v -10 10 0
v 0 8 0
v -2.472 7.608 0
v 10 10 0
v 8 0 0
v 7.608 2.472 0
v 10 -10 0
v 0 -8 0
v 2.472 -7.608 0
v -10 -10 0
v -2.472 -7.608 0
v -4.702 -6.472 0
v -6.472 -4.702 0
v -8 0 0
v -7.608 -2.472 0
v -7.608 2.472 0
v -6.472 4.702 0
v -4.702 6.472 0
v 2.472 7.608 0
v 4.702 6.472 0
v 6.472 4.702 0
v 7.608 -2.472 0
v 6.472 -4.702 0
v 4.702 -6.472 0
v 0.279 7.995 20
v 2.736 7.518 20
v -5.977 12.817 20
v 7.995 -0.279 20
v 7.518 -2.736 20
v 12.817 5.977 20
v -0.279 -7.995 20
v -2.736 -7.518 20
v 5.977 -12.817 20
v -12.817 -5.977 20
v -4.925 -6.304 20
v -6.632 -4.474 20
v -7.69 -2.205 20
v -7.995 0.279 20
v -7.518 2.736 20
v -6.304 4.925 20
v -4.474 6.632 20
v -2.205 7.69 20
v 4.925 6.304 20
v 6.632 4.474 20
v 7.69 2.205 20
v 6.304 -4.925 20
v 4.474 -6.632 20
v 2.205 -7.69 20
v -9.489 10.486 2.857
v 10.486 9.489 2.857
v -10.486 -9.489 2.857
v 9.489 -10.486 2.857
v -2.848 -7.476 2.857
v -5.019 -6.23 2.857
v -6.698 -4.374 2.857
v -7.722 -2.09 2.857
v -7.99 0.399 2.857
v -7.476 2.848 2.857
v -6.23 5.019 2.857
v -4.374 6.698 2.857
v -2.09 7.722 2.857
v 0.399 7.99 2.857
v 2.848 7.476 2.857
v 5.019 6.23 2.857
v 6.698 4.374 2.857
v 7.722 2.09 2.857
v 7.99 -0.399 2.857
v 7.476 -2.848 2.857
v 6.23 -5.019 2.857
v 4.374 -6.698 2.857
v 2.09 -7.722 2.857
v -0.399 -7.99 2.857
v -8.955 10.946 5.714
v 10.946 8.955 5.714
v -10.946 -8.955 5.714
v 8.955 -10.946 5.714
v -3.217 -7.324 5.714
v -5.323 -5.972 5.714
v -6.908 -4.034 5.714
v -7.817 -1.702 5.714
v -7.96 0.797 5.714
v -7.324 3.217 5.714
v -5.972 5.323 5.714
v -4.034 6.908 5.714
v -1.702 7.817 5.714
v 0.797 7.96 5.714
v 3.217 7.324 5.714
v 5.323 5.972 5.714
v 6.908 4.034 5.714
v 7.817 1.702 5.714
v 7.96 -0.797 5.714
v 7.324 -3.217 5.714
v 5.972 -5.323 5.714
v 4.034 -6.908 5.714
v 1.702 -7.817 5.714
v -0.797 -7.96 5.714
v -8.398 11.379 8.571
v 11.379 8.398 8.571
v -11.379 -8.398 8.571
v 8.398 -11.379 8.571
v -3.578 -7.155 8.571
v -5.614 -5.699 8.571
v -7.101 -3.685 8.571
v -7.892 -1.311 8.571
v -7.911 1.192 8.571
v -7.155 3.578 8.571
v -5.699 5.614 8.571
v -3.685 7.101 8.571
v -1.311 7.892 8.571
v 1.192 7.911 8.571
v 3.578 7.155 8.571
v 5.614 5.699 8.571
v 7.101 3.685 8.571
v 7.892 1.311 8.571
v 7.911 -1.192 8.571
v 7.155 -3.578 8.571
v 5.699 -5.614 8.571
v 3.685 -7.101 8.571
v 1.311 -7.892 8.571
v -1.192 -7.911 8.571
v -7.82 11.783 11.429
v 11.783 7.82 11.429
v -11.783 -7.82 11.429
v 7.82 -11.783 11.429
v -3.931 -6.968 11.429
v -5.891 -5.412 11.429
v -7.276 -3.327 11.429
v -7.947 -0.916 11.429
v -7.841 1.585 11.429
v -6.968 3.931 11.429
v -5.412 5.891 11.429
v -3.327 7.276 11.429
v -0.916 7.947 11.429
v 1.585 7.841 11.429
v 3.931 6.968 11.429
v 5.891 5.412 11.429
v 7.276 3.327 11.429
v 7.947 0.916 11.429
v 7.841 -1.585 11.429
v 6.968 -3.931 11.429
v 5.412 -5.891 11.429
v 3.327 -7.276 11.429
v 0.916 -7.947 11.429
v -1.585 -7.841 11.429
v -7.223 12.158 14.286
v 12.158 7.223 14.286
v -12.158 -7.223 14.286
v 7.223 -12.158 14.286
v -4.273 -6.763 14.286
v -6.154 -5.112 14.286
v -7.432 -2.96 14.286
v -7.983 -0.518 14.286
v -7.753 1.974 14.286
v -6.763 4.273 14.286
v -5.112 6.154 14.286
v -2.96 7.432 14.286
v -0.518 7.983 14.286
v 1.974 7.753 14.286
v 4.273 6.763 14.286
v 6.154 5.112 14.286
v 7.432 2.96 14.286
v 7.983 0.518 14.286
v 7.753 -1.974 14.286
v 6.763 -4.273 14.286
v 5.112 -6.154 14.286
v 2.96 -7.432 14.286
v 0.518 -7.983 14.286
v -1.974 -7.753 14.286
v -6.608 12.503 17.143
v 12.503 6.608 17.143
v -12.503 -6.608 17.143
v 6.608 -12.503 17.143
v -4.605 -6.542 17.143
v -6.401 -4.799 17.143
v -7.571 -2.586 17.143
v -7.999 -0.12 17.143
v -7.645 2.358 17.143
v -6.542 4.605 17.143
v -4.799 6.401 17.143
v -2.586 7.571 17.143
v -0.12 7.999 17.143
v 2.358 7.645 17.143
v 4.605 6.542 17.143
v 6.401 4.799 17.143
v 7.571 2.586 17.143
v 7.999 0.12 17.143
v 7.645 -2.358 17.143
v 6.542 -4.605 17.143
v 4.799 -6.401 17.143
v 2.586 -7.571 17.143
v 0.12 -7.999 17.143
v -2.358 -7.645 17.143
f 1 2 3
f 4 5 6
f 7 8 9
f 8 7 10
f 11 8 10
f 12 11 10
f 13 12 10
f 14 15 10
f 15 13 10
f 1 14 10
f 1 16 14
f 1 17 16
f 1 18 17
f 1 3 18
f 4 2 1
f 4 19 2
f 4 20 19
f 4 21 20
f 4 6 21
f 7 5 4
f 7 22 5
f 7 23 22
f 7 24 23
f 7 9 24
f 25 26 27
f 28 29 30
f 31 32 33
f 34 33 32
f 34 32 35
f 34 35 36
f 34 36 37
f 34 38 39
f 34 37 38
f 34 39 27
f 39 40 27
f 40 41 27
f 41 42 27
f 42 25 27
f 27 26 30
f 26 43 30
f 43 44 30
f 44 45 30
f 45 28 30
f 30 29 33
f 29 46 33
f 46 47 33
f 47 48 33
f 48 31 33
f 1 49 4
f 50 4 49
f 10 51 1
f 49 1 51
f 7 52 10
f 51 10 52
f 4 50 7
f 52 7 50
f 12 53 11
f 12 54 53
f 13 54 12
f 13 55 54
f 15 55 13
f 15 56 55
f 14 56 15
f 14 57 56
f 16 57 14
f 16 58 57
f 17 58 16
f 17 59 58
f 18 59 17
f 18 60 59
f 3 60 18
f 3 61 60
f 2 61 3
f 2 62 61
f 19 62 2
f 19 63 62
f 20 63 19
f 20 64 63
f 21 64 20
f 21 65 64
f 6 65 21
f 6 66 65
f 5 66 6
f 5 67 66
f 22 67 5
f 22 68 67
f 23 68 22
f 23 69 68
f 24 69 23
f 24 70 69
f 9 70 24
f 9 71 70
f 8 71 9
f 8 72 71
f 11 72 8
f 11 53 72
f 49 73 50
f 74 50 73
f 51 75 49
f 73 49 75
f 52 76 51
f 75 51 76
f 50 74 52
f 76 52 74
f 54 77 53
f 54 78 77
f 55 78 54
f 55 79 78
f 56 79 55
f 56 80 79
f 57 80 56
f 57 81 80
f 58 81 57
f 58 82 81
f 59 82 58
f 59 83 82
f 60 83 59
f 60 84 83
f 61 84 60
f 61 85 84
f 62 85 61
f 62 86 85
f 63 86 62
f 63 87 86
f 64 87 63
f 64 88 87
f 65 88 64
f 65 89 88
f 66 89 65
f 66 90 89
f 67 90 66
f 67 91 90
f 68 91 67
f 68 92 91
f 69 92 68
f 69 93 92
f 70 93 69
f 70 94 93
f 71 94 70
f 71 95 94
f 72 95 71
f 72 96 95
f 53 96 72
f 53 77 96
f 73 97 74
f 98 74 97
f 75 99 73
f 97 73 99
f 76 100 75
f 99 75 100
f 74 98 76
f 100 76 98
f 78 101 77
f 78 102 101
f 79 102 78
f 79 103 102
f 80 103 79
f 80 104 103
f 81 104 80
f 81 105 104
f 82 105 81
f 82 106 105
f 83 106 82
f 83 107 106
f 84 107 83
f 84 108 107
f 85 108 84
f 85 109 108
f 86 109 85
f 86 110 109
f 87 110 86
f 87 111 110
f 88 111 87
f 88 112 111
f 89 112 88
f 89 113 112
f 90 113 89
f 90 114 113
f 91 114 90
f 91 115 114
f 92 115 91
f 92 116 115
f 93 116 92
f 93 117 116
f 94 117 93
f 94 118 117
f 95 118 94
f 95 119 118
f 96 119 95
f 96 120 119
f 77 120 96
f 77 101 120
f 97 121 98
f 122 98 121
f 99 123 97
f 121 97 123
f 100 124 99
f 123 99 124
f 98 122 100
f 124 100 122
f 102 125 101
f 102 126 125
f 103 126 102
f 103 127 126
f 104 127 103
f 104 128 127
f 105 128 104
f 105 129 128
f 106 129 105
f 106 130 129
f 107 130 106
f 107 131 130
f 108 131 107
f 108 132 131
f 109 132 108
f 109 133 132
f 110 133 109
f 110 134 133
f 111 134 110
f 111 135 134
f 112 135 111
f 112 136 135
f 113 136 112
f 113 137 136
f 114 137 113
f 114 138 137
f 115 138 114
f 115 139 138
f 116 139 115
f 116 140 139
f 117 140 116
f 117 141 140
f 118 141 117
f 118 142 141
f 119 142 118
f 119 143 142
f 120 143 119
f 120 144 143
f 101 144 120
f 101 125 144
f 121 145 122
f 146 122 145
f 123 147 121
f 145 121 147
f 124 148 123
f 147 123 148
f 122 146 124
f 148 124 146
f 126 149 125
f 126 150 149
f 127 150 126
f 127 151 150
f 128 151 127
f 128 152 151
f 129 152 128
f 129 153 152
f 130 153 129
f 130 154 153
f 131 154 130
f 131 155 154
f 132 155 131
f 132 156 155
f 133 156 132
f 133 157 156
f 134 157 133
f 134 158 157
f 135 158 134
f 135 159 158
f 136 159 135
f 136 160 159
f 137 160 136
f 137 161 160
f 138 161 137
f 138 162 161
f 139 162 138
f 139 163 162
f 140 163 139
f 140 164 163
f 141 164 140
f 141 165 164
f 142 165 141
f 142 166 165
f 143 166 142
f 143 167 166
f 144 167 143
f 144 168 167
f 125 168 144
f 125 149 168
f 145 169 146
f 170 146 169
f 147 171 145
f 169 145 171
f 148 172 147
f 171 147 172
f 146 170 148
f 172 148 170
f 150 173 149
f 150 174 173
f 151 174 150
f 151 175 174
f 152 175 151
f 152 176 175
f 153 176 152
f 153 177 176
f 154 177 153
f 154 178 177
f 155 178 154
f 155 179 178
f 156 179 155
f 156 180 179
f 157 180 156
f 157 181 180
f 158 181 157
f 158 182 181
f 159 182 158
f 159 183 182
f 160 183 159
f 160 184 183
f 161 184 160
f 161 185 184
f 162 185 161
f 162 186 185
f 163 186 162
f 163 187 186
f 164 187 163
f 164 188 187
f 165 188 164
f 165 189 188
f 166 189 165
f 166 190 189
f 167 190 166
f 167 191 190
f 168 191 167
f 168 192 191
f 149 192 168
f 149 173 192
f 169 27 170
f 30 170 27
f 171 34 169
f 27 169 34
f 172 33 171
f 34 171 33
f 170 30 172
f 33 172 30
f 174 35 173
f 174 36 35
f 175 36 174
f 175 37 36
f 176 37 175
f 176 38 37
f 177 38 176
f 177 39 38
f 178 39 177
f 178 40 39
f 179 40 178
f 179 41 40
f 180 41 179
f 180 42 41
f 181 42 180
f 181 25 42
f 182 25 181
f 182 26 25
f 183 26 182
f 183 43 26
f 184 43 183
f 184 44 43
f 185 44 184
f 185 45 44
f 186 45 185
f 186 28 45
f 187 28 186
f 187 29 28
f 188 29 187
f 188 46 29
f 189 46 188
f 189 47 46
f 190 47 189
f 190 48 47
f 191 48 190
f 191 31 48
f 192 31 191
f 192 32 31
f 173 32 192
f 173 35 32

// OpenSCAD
linear_extrude(height=20, slices=7, twist=20) {
    difference() {
        square(20, center=true);
        circle(8, $fn=20);
    }
}
